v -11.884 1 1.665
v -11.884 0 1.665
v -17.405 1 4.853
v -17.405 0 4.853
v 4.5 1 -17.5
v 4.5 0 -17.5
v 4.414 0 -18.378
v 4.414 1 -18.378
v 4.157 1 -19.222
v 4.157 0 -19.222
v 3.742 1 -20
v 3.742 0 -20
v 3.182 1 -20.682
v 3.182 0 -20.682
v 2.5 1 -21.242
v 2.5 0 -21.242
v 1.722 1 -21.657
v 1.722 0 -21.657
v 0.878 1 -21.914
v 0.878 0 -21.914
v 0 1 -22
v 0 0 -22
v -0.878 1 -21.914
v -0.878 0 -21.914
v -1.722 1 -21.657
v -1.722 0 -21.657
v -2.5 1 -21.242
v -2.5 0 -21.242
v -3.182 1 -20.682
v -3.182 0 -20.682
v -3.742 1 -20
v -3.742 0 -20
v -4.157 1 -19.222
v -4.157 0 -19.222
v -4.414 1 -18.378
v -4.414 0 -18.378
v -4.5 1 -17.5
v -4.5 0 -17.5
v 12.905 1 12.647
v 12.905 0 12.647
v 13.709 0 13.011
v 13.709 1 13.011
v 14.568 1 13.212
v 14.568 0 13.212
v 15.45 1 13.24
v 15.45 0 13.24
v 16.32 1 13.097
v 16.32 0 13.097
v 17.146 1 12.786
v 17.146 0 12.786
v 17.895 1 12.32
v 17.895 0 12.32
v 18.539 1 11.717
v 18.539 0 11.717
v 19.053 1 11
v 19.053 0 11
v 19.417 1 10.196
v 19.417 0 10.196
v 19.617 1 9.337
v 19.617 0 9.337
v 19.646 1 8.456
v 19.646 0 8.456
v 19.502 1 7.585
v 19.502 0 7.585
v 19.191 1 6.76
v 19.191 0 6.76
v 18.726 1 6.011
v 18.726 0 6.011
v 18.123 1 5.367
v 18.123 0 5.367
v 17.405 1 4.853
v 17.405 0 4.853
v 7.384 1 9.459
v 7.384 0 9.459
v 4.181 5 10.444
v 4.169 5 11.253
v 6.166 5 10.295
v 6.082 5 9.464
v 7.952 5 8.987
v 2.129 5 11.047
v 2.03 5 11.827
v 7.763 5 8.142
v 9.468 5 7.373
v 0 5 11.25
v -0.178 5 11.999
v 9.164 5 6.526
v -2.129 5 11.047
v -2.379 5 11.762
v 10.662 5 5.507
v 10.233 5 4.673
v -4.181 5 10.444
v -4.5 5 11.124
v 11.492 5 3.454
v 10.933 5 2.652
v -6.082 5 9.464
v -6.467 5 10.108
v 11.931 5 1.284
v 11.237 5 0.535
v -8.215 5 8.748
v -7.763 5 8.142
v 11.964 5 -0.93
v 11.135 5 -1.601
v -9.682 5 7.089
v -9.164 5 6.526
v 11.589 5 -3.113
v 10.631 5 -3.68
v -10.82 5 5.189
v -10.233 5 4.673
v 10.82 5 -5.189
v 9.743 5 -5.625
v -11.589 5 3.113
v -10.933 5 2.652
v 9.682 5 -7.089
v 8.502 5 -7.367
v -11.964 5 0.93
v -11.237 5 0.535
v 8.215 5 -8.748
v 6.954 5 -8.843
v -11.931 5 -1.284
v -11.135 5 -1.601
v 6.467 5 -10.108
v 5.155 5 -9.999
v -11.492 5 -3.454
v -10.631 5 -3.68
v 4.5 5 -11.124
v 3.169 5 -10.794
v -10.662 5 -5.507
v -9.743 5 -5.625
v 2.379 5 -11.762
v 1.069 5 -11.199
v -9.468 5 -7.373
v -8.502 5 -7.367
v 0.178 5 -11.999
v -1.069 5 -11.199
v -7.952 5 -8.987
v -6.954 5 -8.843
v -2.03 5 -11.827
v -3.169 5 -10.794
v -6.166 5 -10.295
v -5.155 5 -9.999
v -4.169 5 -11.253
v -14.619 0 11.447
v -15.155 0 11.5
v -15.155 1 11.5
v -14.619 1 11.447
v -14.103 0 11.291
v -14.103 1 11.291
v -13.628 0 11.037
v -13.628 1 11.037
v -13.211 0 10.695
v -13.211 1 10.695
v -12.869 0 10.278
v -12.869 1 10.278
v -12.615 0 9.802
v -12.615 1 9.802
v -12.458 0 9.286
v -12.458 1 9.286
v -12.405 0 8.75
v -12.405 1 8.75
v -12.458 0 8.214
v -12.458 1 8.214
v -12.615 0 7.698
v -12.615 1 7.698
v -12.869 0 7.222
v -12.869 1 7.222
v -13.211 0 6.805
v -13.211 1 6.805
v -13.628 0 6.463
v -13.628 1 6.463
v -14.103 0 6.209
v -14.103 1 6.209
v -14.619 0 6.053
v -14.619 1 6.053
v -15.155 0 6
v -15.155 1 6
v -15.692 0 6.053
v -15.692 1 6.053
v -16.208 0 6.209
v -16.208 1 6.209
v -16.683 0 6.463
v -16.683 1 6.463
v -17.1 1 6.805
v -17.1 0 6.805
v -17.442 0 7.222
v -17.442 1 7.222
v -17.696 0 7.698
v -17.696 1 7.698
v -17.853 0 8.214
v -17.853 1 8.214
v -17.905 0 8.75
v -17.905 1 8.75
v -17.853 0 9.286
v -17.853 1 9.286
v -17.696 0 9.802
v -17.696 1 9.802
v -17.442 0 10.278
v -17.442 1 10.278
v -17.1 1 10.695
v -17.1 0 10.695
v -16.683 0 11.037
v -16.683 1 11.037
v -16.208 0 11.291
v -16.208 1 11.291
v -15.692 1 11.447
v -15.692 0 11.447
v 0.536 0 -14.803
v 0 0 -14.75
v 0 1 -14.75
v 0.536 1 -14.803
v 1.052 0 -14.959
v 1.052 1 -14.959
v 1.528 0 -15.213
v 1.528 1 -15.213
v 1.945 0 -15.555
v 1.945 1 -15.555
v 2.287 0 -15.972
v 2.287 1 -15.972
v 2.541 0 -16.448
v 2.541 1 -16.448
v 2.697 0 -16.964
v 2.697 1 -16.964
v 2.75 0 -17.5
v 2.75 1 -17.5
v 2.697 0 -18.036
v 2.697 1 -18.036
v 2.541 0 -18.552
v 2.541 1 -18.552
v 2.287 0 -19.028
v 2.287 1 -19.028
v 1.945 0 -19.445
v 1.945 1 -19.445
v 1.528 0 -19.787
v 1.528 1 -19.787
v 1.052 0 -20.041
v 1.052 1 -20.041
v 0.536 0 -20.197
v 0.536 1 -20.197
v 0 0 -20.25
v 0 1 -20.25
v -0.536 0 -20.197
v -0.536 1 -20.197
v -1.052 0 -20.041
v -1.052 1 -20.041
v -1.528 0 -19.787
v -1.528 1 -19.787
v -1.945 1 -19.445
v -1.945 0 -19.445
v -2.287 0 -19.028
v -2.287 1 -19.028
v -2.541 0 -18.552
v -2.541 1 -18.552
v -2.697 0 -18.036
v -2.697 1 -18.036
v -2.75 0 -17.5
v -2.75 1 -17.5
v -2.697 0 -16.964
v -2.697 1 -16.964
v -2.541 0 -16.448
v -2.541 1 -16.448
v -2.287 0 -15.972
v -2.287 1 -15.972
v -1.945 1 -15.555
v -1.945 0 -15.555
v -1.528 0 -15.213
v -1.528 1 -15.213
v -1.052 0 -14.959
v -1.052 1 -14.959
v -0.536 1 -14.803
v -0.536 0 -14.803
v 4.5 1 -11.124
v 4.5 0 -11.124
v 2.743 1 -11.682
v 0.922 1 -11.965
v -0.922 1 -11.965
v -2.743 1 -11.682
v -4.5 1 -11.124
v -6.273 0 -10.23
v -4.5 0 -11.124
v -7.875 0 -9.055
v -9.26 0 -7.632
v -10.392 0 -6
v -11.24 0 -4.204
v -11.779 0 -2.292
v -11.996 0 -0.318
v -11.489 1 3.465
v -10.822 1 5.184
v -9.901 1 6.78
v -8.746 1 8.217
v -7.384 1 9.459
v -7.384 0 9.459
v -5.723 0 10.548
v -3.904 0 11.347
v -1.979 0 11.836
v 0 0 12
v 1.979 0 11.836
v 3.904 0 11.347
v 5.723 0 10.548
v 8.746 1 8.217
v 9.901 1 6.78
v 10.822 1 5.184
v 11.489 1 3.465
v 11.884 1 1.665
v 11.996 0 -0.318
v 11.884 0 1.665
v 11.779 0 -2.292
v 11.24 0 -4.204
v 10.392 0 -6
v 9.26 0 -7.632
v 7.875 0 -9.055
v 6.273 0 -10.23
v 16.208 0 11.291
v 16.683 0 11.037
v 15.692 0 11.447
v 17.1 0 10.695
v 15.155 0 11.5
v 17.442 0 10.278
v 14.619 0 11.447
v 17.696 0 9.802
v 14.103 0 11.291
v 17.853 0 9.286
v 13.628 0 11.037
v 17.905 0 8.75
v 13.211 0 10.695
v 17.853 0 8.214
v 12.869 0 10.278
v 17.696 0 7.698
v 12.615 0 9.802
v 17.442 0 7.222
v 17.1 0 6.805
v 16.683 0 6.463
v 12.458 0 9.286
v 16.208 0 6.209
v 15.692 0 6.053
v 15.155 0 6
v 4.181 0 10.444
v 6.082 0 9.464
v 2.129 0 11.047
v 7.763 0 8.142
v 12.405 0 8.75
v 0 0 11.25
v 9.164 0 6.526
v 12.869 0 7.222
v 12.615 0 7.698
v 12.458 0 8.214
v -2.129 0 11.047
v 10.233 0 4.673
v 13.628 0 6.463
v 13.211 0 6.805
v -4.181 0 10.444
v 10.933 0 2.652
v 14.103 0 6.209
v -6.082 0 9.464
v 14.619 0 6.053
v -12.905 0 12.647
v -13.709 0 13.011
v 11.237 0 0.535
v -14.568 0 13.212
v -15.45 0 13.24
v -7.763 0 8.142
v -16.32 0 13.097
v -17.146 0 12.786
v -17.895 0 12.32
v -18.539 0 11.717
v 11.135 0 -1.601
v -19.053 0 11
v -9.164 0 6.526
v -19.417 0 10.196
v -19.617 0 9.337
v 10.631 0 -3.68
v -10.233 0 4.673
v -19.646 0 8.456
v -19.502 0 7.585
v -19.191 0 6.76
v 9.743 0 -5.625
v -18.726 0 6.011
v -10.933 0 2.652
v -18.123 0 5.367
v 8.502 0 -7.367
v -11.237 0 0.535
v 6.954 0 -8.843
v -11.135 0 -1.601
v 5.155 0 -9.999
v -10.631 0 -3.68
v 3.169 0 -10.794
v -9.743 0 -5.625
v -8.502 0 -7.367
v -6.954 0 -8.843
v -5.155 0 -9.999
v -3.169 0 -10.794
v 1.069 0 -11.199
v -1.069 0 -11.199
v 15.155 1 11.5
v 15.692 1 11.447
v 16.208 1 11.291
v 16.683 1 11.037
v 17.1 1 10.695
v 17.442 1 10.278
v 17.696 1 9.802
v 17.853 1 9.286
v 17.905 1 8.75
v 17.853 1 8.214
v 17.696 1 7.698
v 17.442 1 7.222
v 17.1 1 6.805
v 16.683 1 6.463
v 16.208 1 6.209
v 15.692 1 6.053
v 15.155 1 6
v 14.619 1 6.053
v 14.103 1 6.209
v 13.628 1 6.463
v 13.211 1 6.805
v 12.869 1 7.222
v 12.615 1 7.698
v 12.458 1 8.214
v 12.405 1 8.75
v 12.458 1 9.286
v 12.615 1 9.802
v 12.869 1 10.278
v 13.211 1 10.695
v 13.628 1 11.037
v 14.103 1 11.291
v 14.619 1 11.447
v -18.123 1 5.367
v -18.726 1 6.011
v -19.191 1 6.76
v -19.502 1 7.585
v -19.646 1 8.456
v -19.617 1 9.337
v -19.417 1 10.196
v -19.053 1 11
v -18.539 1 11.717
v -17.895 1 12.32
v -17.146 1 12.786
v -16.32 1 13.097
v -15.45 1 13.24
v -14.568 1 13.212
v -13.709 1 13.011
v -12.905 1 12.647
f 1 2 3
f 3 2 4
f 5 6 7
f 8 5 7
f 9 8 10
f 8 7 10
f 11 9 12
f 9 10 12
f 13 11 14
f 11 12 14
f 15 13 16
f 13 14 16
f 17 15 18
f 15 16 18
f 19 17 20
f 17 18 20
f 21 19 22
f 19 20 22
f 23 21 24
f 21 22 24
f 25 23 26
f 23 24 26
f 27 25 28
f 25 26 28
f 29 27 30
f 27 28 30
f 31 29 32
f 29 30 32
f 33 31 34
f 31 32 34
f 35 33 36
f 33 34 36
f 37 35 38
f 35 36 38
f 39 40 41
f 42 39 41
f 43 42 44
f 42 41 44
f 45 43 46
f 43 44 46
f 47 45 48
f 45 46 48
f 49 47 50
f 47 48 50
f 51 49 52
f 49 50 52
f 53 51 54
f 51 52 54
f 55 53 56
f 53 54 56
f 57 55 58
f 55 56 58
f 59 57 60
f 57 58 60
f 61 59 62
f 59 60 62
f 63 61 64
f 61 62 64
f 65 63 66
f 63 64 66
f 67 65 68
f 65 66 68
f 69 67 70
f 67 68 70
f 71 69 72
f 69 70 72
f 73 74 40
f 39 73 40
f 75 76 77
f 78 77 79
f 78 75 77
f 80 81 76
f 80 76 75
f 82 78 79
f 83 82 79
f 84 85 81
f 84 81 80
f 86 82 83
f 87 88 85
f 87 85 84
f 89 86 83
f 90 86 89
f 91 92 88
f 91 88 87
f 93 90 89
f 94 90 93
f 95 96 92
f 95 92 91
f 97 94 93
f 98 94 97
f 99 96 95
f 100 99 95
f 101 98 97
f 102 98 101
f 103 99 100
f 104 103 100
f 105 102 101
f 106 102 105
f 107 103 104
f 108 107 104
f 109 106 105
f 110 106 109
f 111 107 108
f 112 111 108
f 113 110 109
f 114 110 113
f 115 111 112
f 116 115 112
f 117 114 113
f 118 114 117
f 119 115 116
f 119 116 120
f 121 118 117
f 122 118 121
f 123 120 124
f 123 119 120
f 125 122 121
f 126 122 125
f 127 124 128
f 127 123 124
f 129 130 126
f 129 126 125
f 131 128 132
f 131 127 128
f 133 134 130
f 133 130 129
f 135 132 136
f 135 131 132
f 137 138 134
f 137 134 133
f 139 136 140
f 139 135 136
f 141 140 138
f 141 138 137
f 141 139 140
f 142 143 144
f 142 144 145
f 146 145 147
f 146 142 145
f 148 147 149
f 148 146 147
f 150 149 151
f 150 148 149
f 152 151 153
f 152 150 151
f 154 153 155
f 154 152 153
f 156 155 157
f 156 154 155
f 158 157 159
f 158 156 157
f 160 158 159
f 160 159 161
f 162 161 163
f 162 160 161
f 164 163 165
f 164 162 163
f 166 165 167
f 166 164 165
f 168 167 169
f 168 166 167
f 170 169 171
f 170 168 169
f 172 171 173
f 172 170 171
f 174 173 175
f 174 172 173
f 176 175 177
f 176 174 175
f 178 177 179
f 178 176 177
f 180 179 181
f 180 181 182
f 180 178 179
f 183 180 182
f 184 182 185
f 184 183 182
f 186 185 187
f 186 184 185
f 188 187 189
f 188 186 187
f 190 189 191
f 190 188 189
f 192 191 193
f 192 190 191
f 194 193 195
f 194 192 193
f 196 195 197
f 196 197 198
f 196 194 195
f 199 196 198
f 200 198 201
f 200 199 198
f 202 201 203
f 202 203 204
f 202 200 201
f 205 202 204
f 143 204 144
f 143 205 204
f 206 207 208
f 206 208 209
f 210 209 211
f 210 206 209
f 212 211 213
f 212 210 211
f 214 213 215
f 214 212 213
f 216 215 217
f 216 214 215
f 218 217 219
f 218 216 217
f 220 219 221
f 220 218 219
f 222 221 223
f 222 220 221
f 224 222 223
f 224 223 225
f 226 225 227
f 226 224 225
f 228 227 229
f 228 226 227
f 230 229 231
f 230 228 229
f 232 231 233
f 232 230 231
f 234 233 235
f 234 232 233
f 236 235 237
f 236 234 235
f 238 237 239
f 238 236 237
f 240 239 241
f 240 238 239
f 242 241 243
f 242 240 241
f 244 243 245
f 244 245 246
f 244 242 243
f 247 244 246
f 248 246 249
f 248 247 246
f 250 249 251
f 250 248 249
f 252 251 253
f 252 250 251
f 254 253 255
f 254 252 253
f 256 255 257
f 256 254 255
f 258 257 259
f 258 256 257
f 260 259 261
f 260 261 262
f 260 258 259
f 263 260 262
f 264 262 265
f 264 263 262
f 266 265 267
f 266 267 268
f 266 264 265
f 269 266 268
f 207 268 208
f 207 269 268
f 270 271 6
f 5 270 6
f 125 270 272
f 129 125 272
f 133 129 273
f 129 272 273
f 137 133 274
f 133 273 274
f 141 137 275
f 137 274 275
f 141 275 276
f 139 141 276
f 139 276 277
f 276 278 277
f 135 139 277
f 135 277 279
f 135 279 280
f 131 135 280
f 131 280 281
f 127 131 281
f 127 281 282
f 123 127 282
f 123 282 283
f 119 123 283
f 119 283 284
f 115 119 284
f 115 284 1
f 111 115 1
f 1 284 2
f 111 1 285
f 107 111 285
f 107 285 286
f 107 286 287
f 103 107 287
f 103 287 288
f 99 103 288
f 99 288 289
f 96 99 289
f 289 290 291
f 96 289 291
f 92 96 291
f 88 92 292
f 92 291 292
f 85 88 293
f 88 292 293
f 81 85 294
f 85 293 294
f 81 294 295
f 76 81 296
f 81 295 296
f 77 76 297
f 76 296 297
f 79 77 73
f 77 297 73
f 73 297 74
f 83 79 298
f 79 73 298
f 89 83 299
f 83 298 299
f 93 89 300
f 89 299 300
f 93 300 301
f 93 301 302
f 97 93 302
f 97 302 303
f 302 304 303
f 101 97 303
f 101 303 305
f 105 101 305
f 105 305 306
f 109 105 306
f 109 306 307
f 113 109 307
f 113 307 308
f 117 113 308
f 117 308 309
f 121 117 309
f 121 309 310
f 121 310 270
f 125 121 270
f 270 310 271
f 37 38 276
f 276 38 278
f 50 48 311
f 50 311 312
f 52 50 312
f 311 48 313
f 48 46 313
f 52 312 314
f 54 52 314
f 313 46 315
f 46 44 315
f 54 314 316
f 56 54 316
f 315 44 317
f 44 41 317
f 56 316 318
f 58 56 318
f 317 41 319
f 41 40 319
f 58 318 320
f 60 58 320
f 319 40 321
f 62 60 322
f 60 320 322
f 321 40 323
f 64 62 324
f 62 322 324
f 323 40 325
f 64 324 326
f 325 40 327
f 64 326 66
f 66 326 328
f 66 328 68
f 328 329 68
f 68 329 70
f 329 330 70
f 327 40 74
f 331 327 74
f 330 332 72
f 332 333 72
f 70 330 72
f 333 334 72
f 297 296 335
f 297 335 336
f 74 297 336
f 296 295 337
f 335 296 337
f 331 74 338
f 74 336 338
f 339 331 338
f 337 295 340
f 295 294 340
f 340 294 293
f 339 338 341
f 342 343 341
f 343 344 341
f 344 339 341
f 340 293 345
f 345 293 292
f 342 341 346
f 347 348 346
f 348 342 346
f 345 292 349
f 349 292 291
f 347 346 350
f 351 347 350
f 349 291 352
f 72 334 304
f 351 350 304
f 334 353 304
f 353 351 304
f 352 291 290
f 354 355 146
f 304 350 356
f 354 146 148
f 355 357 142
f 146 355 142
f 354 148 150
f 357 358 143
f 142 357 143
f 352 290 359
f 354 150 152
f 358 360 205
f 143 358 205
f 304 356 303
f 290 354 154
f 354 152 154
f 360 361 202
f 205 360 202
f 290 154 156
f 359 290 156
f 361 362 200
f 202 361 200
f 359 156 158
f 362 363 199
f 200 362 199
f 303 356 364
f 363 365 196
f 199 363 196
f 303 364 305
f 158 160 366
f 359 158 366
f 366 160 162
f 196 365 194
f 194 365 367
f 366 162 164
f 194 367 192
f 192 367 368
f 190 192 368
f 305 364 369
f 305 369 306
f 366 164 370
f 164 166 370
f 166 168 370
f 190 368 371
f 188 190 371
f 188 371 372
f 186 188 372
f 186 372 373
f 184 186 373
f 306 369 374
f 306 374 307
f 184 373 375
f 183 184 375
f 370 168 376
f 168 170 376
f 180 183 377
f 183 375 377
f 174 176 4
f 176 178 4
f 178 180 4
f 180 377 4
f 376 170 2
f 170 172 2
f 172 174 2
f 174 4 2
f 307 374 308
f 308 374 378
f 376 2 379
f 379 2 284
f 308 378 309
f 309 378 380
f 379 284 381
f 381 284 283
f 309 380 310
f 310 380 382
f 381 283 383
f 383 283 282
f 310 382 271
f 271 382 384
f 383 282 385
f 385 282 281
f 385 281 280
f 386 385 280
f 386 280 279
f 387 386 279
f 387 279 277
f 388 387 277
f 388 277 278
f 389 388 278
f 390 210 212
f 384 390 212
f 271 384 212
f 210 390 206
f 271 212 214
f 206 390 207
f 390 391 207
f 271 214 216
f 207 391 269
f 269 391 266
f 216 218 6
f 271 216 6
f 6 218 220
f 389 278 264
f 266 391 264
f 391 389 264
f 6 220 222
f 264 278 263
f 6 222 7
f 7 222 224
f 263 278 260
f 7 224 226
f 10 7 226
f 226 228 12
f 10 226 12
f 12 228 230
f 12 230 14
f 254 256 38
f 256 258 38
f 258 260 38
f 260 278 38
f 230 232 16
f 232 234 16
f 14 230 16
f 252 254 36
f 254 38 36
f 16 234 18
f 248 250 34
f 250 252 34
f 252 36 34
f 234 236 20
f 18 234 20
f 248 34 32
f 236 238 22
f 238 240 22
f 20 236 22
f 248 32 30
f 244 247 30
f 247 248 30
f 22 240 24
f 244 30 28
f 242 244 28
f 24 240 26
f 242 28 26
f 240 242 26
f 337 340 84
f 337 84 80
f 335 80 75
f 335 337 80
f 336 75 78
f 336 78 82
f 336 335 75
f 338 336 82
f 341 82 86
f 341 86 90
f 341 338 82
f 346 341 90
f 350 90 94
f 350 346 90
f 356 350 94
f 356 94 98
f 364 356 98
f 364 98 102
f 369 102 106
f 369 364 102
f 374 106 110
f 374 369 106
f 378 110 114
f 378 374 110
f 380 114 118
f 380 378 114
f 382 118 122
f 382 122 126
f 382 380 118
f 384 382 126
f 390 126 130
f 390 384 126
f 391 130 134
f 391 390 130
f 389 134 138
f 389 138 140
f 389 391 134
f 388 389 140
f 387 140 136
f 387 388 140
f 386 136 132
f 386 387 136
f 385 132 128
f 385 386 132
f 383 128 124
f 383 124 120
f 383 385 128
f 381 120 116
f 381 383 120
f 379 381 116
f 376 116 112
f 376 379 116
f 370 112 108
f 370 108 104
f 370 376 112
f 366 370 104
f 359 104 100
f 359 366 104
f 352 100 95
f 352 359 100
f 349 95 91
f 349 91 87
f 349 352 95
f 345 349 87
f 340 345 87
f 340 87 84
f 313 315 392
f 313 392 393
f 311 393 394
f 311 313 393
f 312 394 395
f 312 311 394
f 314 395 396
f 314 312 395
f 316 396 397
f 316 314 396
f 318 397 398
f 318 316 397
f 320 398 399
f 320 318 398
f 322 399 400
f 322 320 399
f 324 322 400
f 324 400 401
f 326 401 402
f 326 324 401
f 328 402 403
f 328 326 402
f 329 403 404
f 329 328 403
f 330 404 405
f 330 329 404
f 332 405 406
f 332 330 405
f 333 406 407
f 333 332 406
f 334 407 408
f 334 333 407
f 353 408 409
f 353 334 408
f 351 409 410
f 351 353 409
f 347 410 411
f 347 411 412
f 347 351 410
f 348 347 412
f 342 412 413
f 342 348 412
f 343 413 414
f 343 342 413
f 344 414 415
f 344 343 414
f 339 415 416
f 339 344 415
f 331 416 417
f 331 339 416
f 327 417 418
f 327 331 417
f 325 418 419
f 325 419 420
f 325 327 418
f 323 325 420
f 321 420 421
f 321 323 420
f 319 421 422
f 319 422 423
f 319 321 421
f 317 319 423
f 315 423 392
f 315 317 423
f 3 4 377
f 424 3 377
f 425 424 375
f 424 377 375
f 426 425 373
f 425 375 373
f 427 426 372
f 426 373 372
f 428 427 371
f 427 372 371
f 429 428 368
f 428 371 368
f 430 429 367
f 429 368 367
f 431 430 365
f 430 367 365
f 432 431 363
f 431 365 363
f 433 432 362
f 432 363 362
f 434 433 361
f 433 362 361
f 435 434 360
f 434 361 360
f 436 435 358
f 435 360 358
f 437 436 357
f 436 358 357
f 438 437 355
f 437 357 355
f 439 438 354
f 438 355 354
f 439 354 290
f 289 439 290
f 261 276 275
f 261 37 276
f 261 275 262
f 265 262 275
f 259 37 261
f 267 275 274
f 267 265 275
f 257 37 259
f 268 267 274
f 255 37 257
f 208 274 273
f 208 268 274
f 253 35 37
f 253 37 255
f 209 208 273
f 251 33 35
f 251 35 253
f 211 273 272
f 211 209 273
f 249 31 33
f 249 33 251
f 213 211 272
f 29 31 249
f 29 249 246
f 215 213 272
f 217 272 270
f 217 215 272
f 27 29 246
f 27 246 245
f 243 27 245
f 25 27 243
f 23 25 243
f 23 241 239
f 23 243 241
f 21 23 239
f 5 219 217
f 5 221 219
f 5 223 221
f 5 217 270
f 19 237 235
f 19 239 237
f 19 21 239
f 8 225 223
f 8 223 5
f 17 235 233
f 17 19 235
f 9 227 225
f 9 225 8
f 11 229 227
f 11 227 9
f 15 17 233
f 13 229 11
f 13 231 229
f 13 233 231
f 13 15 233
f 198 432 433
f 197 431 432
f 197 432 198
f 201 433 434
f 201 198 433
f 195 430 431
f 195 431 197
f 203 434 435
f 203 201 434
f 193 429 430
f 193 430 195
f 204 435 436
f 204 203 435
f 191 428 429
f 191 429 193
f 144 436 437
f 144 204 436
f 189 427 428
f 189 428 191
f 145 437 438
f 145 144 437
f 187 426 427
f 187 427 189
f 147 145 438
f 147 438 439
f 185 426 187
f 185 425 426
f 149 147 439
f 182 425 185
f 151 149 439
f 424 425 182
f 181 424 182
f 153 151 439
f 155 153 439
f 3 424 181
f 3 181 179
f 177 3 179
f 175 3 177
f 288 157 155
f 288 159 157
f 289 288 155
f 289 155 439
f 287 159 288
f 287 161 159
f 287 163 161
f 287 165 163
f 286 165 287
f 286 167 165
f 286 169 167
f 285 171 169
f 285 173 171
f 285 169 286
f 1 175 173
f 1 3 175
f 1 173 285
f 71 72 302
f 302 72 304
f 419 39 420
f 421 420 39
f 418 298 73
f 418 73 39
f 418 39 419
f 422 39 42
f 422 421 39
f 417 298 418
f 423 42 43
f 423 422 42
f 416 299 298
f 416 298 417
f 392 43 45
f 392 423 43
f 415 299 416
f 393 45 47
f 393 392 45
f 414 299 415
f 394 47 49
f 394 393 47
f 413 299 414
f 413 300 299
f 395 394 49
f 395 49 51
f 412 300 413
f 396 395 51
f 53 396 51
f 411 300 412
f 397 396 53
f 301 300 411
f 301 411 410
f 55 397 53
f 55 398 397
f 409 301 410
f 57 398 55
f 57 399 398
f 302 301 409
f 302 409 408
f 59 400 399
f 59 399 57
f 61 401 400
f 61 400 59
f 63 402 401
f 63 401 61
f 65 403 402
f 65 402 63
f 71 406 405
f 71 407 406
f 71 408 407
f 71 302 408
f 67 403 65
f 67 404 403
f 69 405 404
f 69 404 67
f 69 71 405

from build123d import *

# Parameters (mm, degrees)
SKETCH1_R             = 2.75
BOSS_EXTRUDE1_DEPTH   = 1
BOSS_EXTRUDE1_2_DEPTH = 1
BOSS_EXTRUDE1_3_DEPTH = 1
SKETCH1_4_R           = 11.25
BOSS_EXTRUDE2_DEPTH   = 5


with BuildPart() as part:
    # Sketch1 → Boss-Extrude1 (new body)
    with BuildSketch(Plane(origin=(0, 0, 0), x_dir=(1, 0, 0), z_dir=(0, 1, 0))):
        with BuildLine():
            ThreePointArc((12.905444566, -12.647114317), (19.052558883, -11), (17.405444566, -4.852885683))
            Line((17.405444566, -4.852885683), (11.883924434, -1.665034548))
            ThreePointArc((11.883924434, -1.665034548), (10.392304845, -6), (7.383924434, -9.459263182))
            Line((7.383924434, -9.459263182), (12.905444566, -12.647114317))
        make_face()
        with Locations((15.155444566, -8.75)):
            Circle(SKETCH1_R, mode=Mode.SUBTRACT)
    extrude(amount=BOSS_EXTRUDE1_DEPTH)



with BuildPart() as body_2:
    # Sketch1 → Boss-Extrude1 2 (new body)
    with BuildSketch(Plane(origin=(0, 0, 0), x_dir=(1, 0, 0), z_dir=(0, 1, 0))):
        with BuildLine():
            ThreePointArc((-17.405444566, -4.852885683), (-19.052558883, -11), (-12.905444566, -12.647114317))
            Line((-12.905444566, -12.647114317), (-7.383924434, -9.459263182))
            ThreePointArc((-7.383924434, -9.459263182), (-10.392304845, -6), (-11.883924434, -1.665034548))
            Line((-11.883924434, -1.665034548), (-17.405444566, -4.852885683))
        make_face()
        with Locations((-15.155444566, -8.75)):
            Circle(SKETCH1_R, mode=Mode.SUBTRACT)
    extrude(amount=BOSS_EXTRUDE1_2_DEPTH)


with BuildPart() as body_3:
    # Sketch1 → Boss-Extrude1 3 (new body)
    with BuildSketch(Plane(origin=(0, 0, 0), x_dir=(1, 0, 0), z_dir=(0, 1, 0))):
        with BuildLine():
            ThreePointArc((-4.5, 11.124297731), (0, 12), (4.5, 11.124297731))
            Line((4.5, 11.124297731), (4.5, 17.5))
            ThreePointArc((4.5, 17.5), (0, 22), (-4.5, 17.5))
            Line((-4.5, 17.5), (-4.5, 11.124297731))
        make_face()
        with Locations((0, 17.5)):
            Circle(SKETCH1_R, mode=Mode.SUBTRACT)
    extrude(amount=BOSS_EXTRUDE1_3_DEPTH)


with BuildPart() as part_1:
    add(part.part)

    add(body_2.part)  # Boss-Extrude2 merges body 2

    add(body_3.part)  # Boss-Extrude2 merges body 3
    # Sketch1<4> → Boss-Extrude2 (add)
    with BuildSketch(Plane(origin=(0, 0, 0), x_dir=(1, 0, 0), z_dir=(0, 1, 0))):
        with BuildLine():
            ThreePointArc((7.383924434, -9.459263182), (10.392304845, -6), (11.883924434, -1.665034548))
            ThreePointArc((11.883924434, -1.665034548), (11.970945936, -0.834537834), (12, 0))
            ThreePointArc((12, 0), (9.949874371, 6.708203932), (4.5, 11.124297731))
            ThreePointArc((4.5, 11.124297731), (0, 12), (-4.5, 11.124297731))
            ThreePointArc((-4.5, 11.124297731), (-10.392304845, 6), (-11.883924434, -1.665034548))
            ThreePointArc((-11.883924434, -1.665034548), (-10.392304845, -6), (-7.383924434, -9.459263182))
            ThreePointArc((-7.383924434, -9.459263182), (0, -12), (7.383924434, -9.459263182))
        make_face()
        Circle(SKETCH1_4_R, mode=Mode.SUBTRACT)
    extrude(amount=BOSS_EXTRUDE2_DEPTH)


solid = part_1.part
